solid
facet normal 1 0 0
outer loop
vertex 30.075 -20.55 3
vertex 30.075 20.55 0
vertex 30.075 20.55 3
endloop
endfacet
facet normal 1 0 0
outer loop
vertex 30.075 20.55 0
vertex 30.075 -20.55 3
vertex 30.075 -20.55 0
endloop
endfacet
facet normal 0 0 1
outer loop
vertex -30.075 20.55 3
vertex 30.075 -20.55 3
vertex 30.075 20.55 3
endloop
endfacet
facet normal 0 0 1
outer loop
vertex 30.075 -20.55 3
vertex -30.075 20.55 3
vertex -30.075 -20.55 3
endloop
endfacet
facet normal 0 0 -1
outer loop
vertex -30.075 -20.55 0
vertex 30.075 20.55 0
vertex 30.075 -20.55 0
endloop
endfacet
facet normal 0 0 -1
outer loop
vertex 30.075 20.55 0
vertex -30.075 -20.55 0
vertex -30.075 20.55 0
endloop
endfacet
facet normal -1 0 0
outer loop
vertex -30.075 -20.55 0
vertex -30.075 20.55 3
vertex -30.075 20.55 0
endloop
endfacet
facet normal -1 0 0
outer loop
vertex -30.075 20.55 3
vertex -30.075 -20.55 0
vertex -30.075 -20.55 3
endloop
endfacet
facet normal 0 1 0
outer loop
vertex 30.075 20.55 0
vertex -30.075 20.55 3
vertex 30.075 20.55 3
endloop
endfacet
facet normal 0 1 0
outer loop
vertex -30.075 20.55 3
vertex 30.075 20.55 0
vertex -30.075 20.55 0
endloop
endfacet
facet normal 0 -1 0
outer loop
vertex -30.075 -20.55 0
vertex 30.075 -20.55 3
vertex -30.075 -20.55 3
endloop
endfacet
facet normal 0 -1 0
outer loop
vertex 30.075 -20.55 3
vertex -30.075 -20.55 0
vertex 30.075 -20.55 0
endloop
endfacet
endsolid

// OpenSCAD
// file: util.scad
bleedMm = 0.1;
halfBleedMm = bleedMm / 2;

module getPartFromLayers(layer, height) {
  translate([ 0, 0, -halfBleedMm ]) {
    linear_extrude(height + bleedMm, convexity = 3)
        import("parts.dxf", layer = layer);
  }
}

module center(lengthMm, widthMm) {
  translate([ -(lengthMm / 2), -(widthMm / 2), 0 ]) { children(); }
}
// file: switches.scad
use <util.scad>

bleedMm = 0.1;
halfBleedMm = bleedMm / 2;

module topLayerSwitchCutout(topLayerHeightMm) {
  switchGrooveHeight = 3.5;
  union() {
    getPartFromLayers("top-layer-switch-cutout", topLayerHeightMm);
    getPartFromLayers("top-layer-switch-grooves", switchGrooveHeight);
  }
}

module topLayerSwitchCutouts(topLayerHeightMm, numberOfRows, numberOfColumns,
                             keyDistanceMm) {
  socketAndWiringHeight = 1.75;
  for (row = [0:numberOfRows - 1]) {
    for (column = [0:numberOfColumns - 1]) {
      translate([ column * keyDistanceMm, row * keyDistanceMm ]) {
        topLayerSwitchCutout(topLayerHeightMm);
      }
    }
  }
}

module middleLayerSocketCutouts(numberOfRows, numberOfColumns, keyDistanceMm) {
  socketAndWiringHeight = 1.75;
  for (row = [0:numberOfRows - 1]) {
    for (column = [0:numberOfColumns - 1]) {
      translate([ column * keyDistanceMm, row * keyDistanceMm ]) {
        getPartFromLayers("center-layer-socket", socketAndWiringHeight);
      }
    }
  }
}

module middleLayerSocketHoles(middleLayerHeightMm, numberOfRows,
                              numberOfColumns, keyDistanceMm) {
  socketAndWiringHeight = 1.75;
  for (row = [0:numberOfRows - 1]) {
    for (column = [0:numberOfColumns - 1]) {
      translate([ column * keyDistanceMm, row * keyDistanceMm ]) {
        getPartFromLayers("center-layer-switch-holes", middleLayerHeightMm);
      }
    }
  }
}

module topLayerSwitches(topLayerHeightMm, switchBezelMm, numberOfRows,
                        numberOfColumns, keyDistanceMm) {
  layerLengthMm = numberOfColumns * keyDistanceMm;
  layerWidthMm = numberOfRows * keyDistanceMm;

  layerLengthWithBezelMm = layerLengthMm + switchBezelMm;
  layerWidthWithBezelMm = layerWidthMm + switchBezelMm;

  difference() {
    center(layerLengthWithBezelMm, layerWidthWithBezelMm) {
      cube([ layerLengthWithBezelMm, layerWidthWithBezelMm, topLayerHeightMm ]);
    }
    center(layerLengthMm, layerWidthMm) {
      topLayerSwitchCutouts(topLayerHeightMm, numberOfRows, numberOfColumns,
                            keyDistanceMm);
    }
  }
}

module middleLayerSwitches(middleLayerHeightMm, switchBezelMm, numberOfRows,
                           numberOfColumns, keyDistanceMm) {
  layerLengthMm = numberOfColumns * keyDistanceMm;
  layerWidthMm = numberOfRows * keyDistanceMm;

  layerLengthWithBezelMm = layerLengthMm + switchBezelMm;
  layerWidthWithBezelMm = layerWidthMm + switchBezelMm;

  difference() {
    center(layerLengthWithBezelMm, layerWidthWithBezelMm) {
      cube([
        layerLengthWithBezelMm, layerWidthWithBezelMm,
        middleLayerHeightMm
      ]);
    }
    center(layerLengthMm, layerWidthMm) {
      middleLayerSocketCutouts(numberOfRows, numberOfColumns, keyDistanceMm);
      middleLayerSocketHoles(middleLayerHeightMm, numberOfRows, numberOfColumns,
                             keyDistanceMm);
    }
  }
}

module bottomLayerSwitches(bottomLayerHeightMm, switchBezelMm, numberOfRows,
                           numberOfColumns, keyDistanceMm) {
  layerLengthMm = (numberOfColumns * keyDistanceMm) + switchBezelMm;
  layerWidthMm = (numberOfRows * keyDistanceMm) + switchBezelMm;

  center(layerLengthMm, layerWidthMm) {
    cube([ layerLengthMm, layerWidthMm, bottomLayerHeightMm ]);
  }
}
// main file
use <switches.scad>

module main(view) {
  $fs = 0.1;

  numberOfRows = 2;
  numberOfColumns = 3;

  keyDistanceMm = 19.05;

  topLayerHeightMm = 5;
  middleLayerHeightMm = 3;
  bottomLayerHeightMm = 5;

  // Needs to be 3 or more to ensure wiring doesn't fall off edge. Additional
  // bezel should be added to case.
  switchesBezelMm = 3;

  if (view == "exploded") {
    demoExplodeMm = 20;
    translate([ 0, 0, 2 * demoExplodeMm ]) {
      topLayerSwitches(topLayerHeightMm, switchesBezelMm, numberOfRows,
                       numberOfColumns, keyDistanceMm);
    }
    translate([ 0, 0, 1 * demoExplodeMm ]) {
      !middleLayerSwitches(middleLayerHeightMm, switchesBezelMm, numberOfRows,
                           numberOfColumns, keyDistanceMm);
    }
    translate([ 0, 0, 0 * demoExplodeMm ]) {
      bottomLayerSwitches(bottomLayerHeightMm, switchesBezelMm, numberOfRows,
                          numberOfColumns, keyDistanceMm);
    }
  } else if (view == "assembled") {
    translate([ 0, 0, bottomLayerHeightMm + middleLayerHeightMm ]) {
      topLayerSwitches(topLayerHeightMm, switchesBezelMm, numberOfRows,
                       numberOfColumns, keyDistanceMm);
    }
    translate([ 0, 0, bottomLayerHeightMm ]) {
      middleLayerSwitches(middleLayerHeightMm, switchesBezelMm, numberOfRows,
                          numberOfColumns, keyDistanceMm);
    }
    translate([ 0, 0, 0 ]) {
      bottomLayerSwitches(bottomLayerHeightMm, switchesBezelMm, numberOfRows,
                          numberOfColumns, keyDistanceMm);
    }
  } else if (view == "top-layer") {
    topLayerSwitches(topLayerHeightMm, switchesBezelMm, numberOfRows,
                     numberOfColumns, keyDistanceMm);
  } else if (view == "middle-layer") {
    middleLayerSwitches(middleLayerHeightMm, switchesBezelMm, numberOfRows,
                        numberOfColumns, keyDistanceMm);
  } else if (view == "bottom-layer") {
    bottomLayerSwitches(bottomLayerHeightMm, switchesBezelMm, numberOfRows,
                        numberOfColumns, keyDistanceMm);
  }
}

view = "exploded";

main(view);
